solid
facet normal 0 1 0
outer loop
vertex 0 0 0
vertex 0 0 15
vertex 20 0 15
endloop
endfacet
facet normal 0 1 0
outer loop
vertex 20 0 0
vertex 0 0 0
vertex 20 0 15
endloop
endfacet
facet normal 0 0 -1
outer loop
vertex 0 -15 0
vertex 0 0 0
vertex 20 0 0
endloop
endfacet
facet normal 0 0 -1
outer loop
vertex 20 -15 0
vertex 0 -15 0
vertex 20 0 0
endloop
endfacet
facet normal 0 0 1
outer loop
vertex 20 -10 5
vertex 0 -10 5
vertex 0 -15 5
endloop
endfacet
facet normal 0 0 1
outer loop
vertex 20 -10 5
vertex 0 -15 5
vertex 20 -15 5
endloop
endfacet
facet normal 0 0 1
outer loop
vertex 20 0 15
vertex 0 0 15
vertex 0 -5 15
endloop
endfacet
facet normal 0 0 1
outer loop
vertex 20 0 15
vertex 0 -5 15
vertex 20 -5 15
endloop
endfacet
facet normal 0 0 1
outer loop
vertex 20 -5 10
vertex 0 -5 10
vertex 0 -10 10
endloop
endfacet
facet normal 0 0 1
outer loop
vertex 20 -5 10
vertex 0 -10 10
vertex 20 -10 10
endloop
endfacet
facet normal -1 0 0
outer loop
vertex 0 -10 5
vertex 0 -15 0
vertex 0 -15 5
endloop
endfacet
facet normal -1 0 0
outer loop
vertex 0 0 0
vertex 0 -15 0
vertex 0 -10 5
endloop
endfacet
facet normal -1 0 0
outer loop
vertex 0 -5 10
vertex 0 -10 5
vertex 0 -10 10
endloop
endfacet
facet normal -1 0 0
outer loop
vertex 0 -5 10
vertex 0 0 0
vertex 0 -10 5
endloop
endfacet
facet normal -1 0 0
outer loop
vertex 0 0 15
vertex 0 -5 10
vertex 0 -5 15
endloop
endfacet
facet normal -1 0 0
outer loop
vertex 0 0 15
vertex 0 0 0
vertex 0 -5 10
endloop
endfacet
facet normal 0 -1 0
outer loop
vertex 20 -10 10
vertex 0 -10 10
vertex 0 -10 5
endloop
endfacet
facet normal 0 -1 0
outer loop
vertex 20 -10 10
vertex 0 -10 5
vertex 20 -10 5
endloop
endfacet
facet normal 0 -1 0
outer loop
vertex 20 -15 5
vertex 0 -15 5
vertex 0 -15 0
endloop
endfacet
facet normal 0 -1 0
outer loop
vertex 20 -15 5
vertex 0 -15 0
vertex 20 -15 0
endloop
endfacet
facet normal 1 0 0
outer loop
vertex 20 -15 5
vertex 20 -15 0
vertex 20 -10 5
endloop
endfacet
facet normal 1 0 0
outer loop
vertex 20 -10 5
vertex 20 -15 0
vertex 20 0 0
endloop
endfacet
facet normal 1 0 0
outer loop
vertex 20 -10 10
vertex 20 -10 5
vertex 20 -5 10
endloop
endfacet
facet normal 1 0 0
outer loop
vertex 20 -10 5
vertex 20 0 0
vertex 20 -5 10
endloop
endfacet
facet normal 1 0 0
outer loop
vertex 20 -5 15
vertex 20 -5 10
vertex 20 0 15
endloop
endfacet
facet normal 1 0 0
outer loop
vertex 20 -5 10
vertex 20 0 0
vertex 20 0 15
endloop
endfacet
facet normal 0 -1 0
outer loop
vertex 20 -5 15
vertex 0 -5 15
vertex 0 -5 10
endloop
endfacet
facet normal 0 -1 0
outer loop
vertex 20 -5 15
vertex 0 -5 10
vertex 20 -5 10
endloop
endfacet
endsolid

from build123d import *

# Parameters (mm, degrees)
F0_W     = 20
F0_H     = 5
F1_DEPTH = 15
F2_DEPTH = 10
F3_DEPTH = 5


with BuildPart() as f1:
    # F0 (on Front) → F1 (new body)
    with BuildSketch(Plane.XZ):
        with Locations((10, 2.5)):
            Rectangle(F0_W, F0_H)
    extrude(amount=F1_DEPTH)

    # F0 (on Front) → F2 (join)
    with BuildSketch(Plane.XZ):
        with Locations((10, 7.5)):
            Rectangle(F0_W, F0_H)
    extrude(amount=F2_DEPTH)

    # F0 (on Front) → F3 (join)
    with BuildSketch(Plane.XZ):
        with Locations((10, 12.5)):
            Rectangle(F0_W, F0_H)
    extrude(amount=F3_DEPTH)


solid = f1.part
